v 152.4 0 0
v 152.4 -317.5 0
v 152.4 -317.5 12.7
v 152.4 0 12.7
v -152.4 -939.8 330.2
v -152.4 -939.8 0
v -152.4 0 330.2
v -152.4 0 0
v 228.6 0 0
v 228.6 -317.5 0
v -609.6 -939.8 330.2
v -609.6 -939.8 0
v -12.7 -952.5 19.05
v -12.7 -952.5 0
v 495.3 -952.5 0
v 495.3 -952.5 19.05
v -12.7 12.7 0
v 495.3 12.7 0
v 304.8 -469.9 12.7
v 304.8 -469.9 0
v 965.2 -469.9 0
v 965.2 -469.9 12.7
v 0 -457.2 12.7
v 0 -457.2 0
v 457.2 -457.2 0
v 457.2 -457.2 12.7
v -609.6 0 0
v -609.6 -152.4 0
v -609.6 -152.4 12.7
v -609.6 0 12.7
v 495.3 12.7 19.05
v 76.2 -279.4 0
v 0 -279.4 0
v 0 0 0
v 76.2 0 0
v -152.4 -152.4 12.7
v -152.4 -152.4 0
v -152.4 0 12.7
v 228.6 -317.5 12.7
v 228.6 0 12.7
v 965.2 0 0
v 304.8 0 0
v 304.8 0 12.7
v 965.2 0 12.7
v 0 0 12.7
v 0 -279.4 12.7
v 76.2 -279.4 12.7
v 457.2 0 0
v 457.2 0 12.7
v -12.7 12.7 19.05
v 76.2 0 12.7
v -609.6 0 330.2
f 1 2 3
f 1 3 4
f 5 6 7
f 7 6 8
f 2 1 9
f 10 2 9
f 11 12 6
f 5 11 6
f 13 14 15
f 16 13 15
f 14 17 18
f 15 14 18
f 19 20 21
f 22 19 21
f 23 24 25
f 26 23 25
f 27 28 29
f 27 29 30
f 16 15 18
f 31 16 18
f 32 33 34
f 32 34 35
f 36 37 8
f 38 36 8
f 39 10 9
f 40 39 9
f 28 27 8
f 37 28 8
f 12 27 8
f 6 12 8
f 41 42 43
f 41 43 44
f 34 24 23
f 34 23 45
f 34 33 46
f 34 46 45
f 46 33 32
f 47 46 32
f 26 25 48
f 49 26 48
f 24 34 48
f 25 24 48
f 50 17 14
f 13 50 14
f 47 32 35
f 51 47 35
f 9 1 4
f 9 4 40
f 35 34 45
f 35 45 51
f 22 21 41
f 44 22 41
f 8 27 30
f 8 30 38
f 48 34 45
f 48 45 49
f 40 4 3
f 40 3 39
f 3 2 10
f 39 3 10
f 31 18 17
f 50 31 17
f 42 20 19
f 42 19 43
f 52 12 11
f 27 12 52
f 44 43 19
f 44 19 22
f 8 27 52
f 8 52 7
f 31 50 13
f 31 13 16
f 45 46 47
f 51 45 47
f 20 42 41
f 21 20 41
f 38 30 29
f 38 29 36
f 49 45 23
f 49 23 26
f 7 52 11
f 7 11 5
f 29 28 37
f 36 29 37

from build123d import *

# Parameters (mm, degrees)
F0_W     = 457.2
F0_H     = 939.8
F3_DEPTH = 330.2
F0_W_2   = 482.6
F4_DEPTH = 19.05
F1_W     = 660.4
F1_H     = 469.9
F1_W_2   = 76.2
F1_H_2   = 317.5
F1_H_3   = 279.4
F5_DEPTH = 12.7
F2_W     = 457.2
F2_H     = 152.4
F2_H_2   = 457.2
F6_DEPTH = 12.7


with BuildPart() as f3:
    # F0 (on Top) → F3 (new body)
    with BuildSketch(Plane.XY):
        with Locations((-381, -469.9)):
            Rectangle(F0_W, F0_H)
    extrude(amount=F3_DEPTH)


with BuildPart() as f4:
    # F0 (on Top) → F4 (new body)
    with BuildSketch(Plane.XY):
        Polygon((495.3, 12.7), (482.6, 0), (482.6, -939.8), (495.3, -952.5), align=None)
        Polygon((-12.7, 12.7), (0, 0), (482.6, 0), (495.3, 12.7), align=None)
        with Locations((241.3, -469.9)):
            Rectangle(F0_W_2, F0_H)
        Polygon((0, -939.8), (0, 0), (-12.7, 12.7), (-12.7, -952.5), align=None)
        Polygon((482.6, -939.8), (0, -939.8), (-12.7, -952.5), (495.3, -952.5), align=None)
    extrude(amount=F4_DEPTH)


with BuildPart() as f5:
    # F1 (on Top) → F5 (new body)
    with BuildSketch(Plane.XY):
        with Locations((635, -234.95)):
            Rectangle(F1_W, F1_H)
        with Locations((190.5, -158.75)):
            Rectangle(F1_W_2, F1_H_2)
        with Locations((38.1, -139.7)):
            Rectangle(F1_W_2, F1_H_3)
    extrude(amount=F5_DEPTH)


with BuildPart() as f6:
    # F2 (on Top) → F6 (new body)
    with BuildSketch(Plane.XY):
        with Locations((-381, -76.2)):
            Rectangle(F2_W, F2_H)
        with Locations((228.6, -228.6)):
            Rectangle(F2_W, F2_H_2)
    extrude(amount=F6_DEPTH)


solid = Compound([f3.part, f4.part, f5.part, f6.part])
